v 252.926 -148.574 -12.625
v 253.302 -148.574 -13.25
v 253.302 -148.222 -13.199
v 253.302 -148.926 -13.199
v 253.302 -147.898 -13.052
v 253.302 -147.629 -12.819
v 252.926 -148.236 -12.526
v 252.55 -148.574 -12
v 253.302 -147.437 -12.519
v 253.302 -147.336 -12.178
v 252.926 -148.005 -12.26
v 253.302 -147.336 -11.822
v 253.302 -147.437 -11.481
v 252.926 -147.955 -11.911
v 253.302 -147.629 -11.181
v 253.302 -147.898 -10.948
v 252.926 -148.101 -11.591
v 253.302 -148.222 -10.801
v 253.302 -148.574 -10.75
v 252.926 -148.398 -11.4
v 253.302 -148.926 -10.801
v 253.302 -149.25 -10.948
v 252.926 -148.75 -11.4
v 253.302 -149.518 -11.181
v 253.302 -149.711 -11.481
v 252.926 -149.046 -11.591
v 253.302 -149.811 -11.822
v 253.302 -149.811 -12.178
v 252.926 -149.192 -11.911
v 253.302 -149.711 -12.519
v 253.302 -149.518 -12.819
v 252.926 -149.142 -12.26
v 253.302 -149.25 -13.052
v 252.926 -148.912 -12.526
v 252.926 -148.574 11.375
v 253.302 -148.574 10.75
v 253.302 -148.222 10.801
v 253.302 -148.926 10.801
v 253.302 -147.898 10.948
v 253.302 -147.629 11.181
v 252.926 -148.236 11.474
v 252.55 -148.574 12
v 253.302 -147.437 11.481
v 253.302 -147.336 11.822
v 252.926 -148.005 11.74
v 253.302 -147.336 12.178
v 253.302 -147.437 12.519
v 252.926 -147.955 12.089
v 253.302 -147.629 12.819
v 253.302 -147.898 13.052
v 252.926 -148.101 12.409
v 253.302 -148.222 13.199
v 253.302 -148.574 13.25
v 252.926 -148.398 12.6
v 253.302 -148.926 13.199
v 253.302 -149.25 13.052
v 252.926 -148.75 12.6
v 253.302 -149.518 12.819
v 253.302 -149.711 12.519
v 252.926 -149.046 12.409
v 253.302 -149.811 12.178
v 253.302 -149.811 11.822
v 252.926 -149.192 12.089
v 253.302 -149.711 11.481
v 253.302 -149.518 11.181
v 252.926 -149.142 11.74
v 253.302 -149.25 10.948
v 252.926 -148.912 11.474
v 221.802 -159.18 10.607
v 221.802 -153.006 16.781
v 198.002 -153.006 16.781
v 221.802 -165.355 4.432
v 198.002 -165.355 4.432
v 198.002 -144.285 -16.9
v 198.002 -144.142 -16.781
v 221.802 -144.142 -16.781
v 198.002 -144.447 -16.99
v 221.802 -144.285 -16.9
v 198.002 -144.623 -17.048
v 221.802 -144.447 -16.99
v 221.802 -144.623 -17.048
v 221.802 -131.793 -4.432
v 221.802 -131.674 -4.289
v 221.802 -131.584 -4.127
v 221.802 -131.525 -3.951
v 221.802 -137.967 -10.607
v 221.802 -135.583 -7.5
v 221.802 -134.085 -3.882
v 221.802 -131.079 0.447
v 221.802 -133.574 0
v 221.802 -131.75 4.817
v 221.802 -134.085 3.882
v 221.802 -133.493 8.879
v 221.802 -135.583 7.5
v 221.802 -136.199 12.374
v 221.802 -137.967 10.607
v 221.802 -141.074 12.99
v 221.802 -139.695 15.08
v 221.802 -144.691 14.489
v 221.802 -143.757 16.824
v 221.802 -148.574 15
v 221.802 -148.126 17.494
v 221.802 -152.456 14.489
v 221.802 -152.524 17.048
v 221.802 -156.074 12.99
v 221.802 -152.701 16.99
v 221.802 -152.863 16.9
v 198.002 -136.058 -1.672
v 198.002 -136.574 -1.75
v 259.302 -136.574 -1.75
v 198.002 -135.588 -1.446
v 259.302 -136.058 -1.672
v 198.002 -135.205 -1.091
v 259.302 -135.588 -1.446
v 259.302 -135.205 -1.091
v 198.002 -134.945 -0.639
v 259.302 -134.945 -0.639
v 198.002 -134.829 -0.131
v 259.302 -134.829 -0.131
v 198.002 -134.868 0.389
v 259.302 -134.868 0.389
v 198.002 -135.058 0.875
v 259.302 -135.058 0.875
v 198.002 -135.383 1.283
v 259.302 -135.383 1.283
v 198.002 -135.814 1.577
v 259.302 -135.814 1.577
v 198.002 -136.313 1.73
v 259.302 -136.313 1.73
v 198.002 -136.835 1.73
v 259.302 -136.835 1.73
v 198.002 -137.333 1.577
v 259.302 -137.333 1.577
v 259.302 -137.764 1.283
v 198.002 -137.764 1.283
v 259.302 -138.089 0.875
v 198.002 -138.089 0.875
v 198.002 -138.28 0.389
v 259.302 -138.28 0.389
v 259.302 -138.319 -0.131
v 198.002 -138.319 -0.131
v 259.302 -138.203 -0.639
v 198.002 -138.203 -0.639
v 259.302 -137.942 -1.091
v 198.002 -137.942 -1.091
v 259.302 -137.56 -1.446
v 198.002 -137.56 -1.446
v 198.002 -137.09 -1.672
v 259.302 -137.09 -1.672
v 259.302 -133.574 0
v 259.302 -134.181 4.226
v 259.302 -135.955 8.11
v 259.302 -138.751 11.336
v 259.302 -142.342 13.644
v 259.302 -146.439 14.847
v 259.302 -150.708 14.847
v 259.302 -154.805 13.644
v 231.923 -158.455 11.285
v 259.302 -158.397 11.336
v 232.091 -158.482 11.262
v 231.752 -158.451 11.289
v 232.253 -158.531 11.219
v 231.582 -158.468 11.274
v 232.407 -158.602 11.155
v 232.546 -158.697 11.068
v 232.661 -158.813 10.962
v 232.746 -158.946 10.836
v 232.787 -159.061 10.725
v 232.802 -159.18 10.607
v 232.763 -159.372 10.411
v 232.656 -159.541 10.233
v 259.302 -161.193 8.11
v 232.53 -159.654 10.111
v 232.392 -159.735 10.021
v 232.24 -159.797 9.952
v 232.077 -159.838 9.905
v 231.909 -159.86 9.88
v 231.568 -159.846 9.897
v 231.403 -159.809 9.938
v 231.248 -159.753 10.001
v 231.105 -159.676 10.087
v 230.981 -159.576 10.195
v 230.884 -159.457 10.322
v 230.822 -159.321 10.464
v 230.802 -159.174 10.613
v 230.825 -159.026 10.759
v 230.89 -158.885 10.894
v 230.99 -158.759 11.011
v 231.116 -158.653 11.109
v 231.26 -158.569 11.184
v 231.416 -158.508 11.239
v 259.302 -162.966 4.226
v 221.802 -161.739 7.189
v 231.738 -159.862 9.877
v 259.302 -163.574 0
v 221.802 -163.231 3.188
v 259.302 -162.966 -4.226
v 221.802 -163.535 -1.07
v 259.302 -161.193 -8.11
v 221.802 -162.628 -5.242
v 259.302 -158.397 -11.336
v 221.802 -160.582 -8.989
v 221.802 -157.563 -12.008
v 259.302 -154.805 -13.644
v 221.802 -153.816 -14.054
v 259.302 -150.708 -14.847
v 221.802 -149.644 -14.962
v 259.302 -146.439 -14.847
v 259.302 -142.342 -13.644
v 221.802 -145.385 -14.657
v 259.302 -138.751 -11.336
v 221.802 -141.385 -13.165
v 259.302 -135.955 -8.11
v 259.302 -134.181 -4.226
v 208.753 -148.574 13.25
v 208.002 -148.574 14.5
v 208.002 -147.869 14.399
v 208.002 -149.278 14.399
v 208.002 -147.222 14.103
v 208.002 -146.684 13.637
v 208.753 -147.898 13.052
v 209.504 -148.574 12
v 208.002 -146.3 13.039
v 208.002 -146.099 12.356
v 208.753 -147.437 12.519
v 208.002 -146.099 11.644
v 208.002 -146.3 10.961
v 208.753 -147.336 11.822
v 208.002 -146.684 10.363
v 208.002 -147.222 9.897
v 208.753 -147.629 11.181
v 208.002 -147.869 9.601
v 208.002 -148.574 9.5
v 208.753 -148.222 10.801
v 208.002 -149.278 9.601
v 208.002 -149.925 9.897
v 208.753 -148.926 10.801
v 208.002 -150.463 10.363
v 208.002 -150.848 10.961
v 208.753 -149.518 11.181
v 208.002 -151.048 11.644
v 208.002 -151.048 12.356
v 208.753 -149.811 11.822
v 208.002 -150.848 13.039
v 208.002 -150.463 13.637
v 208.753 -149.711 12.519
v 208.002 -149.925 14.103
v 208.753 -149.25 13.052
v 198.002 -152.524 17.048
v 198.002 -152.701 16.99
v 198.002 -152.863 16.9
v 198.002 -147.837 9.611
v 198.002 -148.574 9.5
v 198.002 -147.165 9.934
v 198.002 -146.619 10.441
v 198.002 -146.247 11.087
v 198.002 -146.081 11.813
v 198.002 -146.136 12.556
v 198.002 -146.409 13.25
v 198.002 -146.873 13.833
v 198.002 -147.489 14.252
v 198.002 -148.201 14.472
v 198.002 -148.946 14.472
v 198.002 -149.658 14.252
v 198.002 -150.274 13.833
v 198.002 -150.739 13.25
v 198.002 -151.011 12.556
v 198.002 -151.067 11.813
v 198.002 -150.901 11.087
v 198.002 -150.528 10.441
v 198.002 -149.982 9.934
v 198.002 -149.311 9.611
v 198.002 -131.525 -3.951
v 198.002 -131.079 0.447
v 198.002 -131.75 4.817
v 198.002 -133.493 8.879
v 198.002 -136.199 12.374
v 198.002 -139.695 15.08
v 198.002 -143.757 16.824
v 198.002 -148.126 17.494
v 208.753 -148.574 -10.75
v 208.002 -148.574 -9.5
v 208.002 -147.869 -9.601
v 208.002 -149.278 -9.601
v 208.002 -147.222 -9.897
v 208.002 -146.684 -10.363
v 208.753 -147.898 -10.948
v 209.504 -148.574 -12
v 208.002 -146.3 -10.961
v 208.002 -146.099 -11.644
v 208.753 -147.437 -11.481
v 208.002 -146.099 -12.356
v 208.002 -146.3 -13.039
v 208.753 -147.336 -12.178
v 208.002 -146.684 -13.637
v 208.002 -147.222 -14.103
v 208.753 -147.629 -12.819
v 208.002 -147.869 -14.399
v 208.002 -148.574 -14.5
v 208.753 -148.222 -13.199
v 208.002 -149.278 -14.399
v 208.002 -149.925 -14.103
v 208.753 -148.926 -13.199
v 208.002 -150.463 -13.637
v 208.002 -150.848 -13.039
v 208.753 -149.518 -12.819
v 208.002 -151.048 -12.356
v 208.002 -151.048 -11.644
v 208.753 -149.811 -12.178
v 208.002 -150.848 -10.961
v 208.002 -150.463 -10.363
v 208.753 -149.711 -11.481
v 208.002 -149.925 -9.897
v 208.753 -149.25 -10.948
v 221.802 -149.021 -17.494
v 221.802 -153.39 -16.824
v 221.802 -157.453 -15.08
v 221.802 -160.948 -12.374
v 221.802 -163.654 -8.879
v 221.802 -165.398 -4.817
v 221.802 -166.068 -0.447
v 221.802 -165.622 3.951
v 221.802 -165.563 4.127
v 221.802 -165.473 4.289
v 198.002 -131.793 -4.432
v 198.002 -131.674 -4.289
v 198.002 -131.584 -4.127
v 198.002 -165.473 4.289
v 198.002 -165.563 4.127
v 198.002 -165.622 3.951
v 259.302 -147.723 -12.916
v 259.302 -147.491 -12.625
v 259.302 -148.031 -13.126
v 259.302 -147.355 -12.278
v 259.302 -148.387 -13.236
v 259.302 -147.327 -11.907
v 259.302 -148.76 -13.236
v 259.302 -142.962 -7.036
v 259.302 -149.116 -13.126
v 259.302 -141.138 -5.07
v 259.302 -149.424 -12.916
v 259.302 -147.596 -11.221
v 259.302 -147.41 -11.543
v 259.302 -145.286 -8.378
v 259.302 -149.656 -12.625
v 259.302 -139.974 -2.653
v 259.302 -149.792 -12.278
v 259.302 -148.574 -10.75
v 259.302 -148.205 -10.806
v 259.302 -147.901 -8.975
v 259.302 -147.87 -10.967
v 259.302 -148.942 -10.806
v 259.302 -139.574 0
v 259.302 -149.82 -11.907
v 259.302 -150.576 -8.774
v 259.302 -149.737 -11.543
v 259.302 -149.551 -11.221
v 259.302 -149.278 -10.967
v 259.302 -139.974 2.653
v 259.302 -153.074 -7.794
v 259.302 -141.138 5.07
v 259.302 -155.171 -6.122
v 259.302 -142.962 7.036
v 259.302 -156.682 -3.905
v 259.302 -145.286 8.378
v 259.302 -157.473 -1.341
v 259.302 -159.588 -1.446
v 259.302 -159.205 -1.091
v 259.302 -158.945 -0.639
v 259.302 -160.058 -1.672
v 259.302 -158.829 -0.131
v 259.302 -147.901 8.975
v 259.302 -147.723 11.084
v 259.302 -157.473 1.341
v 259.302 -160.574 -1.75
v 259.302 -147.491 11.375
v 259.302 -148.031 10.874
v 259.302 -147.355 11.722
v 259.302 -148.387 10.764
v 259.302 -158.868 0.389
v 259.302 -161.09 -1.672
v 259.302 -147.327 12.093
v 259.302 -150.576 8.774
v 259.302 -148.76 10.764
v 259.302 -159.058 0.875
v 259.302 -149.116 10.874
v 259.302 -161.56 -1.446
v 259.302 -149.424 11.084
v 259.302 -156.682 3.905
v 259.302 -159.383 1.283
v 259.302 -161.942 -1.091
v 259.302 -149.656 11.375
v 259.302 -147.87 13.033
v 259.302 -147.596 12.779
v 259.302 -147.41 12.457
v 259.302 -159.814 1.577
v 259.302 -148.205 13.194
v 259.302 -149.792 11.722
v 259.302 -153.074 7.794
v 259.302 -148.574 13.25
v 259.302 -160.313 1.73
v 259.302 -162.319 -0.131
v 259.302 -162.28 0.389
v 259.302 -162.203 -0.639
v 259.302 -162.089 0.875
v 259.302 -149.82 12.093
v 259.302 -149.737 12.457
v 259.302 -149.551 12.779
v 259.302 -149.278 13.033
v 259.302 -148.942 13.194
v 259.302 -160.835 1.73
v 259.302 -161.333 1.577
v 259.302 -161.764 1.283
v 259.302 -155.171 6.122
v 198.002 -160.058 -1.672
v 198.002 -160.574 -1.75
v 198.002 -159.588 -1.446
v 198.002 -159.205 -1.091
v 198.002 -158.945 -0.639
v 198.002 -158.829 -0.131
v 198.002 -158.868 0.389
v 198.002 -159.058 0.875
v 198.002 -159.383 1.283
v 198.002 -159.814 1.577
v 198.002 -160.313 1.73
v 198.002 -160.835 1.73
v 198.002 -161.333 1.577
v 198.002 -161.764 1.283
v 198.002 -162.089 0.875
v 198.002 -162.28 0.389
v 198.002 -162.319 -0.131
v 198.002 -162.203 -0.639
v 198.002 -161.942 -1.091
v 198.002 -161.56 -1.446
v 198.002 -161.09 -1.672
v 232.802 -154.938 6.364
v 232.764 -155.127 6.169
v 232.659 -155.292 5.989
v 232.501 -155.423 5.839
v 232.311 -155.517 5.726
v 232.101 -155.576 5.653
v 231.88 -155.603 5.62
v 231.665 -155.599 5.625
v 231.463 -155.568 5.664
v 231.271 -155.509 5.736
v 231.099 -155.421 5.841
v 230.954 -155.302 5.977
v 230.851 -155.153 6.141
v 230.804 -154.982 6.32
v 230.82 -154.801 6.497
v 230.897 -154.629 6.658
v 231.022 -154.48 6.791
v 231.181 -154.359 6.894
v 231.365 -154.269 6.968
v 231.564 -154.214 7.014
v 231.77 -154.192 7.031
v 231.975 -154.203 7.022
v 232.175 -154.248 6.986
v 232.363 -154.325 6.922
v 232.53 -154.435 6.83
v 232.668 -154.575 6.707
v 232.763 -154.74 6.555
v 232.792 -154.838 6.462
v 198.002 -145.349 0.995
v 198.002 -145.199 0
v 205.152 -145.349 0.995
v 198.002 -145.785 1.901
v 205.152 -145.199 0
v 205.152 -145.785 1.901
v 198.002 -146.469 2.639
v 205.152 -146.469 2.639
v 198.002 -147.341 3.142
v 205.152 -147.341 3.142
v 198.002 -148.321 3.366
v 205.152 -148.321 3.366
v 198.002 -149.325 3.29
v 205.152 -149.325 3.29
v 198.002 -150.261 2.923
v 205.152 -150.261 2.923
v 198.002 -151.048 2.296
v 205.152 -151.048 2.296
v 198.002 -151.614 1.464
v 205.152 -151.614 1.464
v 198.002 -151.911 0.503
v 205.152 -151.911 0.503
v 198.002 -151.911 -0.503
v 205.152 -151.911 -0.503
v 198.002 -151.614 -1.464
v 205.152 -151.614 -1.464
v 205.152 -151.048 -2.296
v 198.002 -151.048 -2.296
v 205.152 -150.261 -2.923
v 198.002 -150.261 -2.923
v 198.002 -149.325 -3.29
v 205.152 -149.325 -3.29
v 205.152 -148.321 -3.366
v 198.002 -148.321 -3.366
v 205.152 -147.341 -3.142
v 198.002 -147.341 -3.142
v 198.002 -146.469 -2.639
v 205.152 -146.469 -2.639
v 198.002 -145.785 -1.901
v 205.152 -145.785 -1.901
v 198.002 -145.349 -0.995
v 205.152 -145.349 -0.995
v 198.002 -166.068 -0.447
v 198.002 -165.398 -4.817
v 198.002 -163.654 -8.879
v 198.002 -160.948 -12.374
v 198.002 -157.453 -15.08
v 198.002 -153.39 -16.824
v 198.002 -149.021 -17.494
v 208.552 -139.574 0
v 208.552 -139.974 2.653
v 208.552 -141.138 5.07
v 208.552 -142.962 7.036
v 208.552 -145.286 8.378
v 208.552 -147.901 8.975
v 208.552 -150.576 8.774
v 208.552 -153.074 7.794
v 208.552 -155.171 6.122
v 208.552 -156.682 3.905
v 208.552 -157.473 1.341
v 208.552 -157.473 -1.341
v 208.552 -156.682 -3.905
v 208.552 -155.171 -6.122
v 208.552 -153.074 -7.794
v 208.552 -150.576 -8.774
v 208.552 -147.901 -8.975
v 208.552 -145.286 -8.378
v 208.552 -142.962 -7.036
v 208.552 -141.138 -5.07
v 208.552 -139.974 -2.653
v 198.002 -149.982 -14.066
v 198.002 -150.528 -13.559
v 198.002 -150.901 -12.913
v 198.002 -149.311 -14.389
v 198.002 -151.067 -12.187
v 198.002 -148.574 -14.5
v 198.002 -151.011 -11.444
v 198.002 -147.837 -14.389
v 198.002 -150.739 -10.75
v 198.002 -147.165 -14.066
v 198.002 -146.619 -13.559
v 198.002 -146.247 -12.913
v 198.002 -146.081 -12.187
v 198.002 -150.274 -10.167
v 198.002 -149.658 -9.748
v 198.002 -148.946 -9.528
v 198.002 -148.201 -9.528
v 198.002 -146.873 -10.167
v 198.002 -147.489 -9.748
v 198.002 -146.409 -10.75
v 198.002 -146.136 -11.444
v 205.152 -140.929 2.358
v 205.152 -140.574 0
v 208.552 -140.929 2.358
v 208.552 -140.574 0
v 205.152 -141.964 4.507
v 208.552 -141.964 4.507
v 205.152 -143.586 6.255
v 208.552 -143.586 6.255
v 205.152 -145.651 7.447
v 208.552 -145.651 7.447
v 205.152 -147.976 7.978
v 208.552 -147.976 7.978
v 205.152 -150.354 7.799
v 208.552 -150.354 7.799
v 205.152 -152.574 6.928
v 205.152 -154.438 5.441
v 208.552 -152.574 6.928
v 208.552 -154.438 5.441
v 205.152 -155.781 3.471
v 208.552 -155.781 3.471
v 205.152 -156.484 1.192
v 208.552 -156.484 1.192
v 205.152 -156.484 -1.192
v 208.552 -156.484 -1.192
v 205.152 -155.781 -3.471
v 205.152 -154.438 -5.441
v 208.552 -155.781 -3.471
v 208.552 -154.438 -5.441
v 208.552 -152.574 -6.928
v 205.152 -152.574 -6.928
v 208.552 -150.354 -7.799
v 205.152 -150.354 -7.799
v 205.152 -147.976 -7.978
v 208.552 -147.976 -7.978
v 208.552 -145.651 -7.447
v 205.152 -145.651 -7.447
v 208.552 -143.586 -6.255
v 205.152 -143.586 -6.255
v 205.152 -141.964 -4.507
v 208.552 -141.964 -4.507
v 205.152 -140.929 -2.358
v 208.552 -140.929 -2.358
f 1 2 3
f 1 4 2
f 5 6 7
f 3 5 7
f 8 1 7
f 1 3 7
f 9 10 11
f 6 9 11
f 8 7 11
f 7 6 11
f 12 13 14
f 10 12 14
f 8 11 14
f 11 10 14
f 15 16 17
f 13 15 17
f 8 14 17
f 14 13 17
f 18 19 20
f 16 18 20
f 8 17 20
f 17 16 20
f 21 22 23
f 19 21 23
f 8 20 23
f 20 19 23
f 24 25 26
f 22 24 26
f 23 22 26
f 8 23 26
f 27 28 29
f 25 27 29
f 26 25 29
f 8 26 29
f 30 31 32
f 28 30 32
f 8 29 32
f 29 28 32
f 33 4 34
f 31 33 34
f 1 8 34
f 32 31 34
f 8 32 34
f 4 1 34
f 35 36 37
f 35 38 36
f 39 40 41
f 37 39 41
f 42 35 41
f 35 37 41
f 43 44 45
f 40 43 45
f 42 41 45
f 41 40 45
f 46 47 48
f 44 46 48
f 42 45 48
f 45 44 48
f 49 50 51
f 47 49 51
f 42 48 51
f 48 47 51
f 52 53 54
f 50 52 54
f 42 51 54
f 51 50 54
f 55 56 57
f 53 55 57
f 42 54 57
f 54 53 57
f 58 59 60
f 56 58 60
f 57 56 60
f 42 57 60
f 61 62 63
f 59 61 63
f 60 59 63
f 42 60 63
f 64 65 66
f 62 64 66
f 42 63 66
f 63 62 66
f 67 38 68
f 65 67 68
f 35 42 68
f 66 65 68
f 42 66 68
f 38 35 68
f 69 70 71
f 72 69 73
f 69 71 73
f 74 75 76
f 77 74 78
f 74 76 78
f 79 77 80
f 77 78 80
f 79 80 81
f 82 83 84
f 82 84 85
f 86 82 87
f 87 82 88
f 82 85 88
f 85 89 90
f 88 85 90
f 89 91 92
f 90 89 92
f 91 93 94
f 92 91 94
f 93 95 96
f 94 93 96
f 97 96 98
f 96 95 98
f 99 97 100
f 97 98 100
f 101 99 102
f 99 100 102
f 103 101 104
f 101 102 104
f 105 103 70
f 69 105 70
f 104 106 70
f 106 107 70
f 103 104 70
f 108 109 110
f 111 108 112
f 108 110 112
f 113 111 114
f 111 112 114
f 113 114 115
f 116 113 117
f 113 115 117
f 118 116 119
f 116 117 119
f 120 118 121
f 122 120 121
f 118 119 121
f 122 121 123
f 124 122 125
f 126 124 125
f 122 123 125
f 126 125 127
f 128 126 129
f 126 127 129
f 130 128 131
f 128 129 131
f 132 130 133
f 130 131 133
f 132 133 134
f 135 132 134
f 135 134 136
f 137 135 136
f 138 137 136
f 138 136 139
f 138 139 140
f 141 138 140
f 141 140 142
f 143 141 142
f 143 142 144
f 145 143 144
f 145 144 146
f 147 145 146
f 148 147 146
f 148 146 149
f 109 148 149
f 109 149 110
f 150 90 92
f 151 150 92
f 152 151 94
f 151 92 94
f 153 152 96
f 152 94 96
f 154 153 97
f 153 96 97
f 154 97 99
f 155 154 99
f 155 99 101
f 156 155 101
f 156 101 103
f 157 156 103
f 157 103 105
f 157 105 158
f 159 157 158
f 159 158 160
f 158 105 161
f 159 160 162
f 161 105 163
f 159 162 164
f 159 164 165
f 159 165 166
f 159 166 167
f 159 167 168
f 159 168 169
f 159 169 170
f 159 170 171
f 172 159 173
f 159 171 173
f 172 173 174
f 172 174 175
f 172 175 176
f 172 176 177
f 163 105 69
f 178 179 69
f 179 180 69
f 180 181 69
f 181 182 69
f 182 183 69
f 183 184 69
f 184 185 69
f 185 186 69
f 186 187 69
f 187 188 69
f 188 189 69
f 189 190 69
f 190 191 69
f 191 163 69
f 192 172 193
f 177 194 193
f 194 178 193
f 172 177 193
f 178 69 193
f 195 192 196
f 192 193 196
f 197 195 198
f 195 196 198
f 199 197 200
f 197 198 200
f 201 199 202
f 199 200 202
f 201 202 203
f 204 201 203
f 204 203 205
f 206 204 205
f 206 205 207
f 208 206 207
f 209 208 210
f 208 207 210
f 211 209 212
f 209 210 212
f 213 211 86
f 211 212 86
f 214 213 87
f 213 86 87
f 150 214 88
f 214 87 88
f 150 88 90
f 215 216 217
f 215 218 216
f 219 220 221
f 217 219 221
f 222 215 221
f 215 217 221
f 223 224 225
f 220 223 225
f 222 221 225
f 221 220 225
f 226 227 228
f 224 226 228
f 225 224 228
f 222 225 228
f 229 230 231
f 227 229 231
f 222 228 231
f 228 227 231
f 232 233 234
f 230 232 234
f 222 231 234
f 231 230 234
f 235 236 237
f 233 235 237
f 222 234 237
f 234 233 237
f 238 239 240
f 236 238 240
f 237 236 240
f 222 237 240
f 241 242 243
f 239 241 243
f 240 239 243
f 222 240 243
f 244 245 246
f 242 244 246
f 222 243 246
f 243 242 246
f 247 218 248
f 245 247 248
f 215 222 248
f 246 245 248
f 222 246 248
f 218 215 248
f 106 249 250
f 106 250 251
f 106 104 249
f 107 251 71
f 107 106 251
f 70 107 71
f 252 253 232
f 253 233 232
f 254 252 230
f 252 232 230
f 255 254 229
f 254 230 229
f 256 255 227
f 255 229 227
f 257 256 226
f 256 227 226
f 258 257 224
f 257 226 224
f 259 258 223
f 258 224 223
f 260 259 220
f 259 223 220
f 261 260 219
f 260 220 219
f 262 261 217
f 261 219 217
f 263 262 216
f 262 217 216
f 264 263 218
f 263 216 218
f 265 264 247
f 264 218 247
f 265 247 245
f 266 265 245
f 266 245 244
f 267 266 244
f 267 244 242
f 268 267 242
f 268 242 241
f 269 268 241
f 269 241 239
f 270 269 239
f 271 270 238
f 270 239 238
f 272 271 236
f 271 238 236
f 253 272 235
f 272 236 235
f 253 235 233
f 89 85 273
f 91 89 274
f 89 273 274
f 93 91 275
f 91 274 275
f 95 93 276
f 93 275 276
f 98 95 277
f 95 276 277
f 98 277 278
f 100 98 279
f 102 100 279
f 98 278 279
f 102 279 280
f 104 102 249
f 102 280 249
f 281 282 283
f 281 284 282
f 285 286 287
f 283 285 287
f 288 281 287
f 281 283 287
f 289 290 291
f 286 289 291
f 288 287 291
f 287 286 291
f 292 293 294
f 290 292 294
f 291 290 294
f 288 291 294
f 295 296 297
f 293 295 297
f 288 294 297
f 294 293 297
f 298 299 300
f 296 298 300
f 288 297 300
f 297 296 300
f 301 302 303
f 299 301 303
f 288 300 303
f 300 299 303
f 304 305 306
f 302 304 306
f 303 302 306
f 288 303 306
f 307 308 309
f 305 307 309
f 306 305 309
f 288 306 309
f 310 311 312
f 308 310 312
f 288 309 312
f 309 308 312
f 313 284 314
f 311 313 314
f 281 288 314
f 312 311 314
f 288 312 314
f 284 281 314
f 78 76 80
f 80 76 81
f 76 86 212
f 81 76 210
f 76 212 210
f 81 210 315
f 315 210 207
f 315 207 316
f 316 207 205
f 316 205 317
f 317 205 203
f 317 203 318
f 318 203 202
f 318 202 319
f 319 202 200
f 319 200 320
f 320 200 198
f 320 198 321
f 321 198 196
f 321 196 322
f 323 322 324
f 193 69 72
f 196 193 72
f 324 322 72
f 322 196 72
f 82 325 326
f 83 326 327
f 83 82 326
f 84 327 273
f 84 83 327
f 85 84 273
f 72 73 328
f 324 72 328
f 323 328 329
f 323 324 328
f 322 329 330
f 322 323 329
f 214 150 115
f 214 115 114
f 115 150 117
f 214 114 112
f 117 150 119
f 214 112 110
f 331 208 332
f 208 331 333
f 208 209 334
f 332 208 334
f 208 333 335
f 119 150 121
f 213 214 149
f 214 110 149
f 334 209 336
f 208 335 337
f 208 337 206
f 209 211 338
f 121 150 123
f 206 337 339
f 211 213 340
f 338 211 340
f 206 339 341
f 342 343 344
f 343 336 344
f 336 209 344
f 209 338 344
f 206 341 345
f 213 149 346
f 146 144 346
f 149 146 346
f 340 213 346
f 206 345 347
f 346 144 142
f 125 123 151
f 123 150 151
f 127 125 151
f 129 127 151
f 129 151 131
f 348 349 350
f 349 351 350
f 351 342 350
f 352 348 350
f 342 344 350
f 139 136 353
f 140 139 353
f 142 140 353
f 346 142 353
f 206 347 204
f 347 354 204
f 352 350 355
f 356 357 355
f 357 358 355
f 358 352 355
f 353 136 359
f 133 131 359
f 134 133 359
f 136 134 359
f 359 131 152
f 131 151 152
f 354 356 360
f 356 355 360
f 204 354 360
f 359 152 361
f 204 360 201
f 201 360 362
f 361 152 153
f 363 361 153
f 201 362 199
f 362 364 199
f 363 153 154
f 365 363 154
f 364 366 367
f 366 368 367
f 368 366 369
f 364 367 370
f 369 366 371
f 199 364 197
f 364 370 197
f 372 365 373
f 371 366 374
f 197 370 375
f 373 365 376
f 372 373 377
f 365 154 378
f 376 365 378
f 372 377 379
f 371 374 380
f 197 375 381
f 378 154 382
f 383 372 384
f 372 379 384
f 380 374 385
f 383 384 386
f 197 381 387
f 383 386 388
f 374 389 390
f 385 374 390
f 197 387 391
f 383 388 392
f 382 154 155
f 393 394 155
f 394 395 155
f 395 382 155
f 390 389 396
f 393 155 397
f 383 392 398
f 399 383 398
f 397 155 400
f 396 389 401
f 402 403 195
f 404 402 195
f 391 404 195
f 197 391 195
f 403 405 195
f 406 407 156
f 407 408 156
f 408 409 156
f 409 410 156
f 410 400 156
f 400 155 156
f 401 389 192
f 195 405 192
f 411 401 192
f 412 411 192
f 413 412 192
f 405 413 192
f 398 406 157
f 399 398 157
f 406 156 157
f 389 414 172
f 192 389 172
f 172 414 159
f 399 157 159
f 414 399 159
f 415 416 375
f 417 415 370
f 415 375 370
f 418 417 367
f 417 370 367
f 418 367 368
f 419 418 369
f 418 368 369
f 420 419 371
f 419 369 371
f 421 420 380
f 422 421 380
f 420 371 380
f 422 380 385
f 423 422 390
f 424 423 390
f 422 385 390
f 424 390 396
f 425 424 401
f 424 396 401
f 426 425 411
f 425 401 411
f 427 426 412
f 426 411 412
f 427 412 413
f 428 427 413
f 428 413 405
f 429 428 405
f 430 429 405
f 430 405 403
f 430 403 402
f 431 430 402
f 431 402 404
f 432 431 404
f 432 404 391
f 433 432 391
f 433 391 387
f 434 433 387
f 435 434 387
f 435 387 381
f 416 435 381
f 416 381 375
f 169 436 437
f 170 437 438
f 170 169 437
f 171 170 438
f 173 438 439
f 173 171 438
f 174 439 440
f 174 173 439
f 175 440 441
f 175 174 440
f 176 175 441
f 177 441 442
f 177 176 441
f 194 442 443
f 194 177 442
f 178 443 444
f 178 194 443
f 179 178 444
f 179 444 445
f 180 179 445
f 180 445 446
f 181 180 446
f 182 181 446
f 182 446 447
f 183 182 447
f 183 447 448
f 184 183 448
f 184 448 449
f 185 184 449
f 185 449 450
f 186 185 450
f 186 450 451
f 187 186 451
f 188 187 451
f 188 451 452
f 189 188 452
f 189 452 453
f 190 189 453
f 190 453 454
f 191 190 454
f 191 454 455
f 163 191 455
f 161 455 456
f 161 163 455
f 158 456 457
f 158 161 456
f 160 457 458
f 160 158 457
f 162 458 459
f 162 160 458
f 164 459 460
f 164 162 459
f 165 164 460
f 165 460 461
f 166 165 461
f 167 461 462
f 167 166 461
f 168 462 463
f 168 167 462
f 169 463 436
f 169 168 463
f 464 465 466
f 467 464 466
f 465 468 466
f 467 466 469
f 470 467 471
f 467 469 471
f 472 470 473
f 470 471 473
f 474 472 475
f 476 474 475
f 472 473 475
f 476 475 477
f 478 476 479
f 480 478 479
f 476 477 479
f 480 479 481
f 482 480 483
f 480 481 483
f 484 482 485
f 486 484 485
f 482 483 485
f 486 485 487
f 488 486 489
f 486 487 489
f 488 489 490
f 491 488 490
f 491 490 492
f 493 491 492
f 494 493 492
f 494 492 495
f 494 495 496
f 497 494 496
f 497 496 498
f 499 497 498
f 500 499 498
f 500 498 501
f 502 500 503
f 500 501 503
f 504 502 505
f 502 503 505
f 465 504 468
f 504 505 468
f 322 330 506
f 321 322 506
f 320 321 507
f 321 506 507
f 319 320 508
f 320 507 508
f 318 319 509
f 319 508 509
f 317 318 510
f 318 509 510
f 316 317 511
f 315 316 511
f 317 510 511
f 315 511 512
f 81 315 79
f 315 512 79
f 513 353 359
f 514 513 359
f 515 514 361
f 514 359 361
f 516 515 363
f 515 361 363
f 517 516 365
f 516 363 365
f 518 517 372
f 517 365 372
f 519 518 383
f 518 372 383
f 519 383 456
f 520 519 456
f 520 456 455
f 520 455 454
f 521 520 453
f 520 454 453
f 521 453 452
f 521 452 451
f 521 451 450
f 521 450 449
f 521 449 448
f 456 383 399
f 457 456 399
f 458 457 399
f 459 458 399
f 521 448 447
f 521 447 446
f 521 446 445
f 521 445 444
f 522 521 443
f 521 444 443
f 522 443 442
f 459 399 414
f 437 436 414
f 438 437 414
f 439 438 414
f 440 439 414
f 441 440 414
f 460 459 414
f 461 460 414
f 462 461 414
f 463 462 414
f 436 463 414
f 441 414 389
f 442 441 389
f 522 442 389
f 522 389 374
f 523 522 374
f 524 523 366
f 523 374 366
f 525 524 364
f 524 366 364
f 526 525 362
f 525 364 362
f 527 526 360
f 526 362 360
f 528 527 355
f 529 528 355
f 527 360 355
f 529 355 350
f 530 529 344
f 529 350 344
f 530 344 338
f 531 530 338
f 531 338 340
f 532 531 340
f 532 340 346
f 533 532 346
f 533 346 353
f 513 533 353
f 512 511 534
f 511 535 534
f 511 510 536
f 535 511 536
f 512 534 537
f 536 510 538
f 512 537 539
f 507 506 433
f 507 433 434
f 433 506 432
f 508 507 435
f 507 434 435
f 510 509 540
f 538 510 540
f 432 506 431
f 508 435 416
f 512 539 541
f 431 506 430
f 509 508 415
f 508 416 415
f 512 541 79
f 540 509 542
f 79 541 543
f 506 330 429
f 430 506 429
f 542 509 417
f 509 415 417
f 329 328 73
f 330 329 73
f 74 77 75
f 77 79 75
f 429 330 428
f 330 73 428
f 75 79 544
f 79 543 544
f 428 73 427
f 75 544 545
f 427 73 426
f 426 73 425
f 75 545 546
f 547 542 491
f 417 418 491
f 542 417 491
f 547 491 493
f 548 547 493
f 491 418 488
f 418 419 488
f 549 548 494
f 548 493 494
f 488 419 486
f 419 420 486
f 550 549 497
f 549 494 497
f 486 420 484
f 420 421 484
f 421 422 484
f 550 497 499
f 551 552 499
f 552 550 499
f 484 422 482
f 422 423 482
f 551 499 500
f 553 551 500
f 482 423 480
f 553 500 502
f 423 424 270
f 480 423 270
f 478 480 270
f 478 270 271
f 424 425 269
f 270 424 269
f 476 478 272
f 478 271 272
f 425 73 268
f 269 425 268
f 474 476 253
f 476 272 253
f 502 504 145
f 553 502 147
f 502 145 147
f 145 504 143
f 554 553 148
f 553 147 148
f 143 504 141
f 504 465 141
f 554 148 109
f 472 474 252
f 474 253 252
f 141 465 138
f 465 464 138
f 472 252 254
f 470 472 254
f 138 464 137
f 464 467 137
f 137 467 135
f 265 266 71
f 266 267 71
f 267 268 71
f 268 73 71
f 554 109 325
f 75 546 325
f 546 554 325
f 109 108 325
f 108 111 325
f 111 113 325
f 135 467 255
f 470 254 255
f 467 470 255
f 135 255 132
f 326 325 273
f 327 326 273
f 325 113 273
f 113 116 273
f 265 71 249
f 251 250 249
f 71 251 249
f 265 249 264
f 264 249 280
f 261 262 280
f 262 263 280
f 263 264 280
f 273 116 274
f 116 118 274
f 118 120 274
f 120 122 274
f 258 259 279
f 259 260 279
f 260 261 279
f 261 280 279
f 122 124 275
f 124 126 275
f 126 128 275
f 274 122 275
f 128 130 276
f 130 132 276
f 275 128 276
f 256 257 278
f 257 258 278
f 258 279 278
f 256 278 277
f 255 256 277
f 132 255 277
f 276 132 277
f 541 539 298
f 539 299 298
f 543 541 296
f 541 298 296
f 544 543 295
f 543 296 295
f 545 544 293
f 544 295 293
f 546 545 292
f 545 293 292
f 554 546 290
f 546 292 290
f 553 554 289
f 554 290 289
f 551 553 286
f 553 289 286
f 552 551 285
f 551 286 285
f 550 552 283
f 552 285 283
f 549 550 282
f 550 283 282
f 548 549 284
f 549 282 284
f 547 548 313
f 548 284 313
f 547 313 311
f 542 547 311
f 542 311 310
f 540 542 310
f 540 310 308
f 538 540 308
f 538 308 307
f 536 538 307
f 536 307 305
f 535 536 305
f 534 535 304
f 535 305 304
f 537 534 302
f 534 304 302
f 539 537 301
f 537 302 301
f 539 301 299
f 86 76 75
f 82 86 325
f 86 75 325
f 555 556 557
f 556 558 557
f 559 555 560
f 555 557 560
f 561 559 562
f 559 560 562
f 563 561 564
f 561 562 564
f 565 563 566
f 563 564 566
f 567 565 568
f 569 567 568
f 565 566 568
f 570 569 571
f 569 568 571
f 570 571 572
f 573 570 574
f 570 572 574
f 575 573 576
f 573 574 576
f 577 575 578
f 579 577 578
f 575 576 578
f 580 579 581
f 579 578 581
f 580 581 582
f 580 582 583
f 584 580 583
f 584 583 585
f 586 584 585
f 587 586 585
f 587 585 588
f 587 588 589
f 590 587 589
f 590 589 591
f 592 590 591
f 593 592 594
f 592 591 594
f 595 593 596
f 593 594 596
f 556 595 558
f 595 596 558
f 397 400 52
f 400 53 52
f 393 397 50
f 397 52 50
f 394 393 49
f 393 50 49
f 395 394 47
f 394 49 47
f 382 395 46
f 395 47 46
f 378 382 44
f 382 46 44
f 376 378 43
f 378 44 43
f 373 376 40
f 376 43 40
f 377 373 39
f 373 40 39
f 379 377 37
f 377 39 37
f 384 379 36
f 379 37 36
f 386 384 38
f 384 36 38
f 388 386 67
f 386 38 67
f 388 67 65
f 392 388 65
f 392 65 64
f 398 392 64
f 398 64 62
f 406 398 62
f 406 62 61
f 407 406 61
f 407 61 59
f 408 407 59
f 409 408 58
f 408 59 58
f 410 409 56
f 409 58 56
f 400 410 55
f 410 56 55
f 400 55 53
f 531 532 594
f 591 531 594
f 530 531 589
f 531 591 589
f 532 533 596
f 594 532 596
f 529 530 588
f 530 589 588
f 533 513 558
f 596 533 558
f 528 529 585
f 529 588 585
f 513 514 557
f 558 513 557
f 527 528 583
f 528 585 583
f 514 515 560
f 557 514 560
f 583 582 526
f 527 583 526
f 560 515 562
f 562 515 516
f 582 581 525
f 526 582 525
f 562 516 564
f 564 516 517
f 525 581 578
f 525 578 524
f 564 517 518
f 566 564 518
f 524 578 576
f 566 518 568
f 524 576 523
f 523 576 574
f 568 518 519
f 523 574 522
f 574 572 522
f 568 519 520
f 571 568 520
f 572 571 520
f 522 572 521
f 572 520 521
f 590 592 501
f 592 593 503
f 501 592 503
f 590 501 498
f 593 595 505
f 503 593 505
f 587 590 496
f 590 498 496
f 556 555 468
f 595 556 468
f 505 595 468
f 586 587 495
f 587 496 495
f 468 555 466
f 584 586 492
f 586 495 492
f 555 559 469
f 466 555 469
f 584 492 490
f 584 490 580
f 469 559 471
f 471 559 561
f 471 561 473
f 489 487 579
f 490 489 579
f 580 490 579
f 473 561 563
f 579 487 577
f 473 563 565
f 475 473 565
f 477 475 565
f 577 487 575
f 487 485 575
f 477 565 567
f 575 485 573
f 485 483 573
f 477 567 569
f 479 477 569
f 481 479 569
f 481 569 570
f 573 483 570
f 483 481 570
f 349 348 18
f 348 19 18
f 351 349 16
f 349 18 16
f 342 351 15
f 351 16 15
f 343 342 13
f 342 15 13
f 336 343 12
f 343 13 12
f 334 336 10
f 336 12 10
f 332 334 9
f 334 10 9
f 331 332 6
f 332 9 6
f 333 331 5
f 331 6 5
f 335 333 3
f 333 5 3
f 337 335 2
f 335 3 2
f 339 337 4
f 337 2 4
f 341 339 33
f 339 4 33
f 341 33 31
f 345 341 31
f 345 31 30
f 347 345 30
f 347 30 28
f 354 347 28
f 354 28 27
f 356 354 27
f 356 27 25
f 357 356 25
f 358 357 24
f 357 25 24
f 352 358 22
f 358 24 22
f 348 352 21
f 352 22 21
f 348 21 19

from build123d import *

# Parameters (mm, degrees)
CUT_EXTRUDE1_REACH          = 179.889
SKETCH8_R                   = 1.75
TAP_DRILL_FOR_M3_TAP2_D     = 2.5
TAP_DRILL_FOR_M3_TAP2_DEPTH = 6
TAP_DRILL_FOR_M3_TAP2_TIP   = 0.751075774
TAP_DRILL_FOR_M6_TAP1_D     = 5
TAP_DRILL_FOR_M6_TAP1_DEPTH = 10
TAP_DRILL_FOR_M6_TAP1_TIP   = 1.502151548
CUT_EXTRUDE2_REACH          = 179.889
FILLET1_R                   = 1
CUT_EXTRUDE3_REACH          = 335.718
SKETCH18_R                  = 1


with BuildPart() as part:
    # Sketch3 → Revolve1 (revolve)
    with BuildSketch(Plane.XY):
        Polygon((208.551545348, -139.573704322), (250.685153788, -139.573704322), (259.301545348, -139.573704322), (259.301545348, -133.573704322), (238.427343436, -133.573704322), (221.801545348, -133.573704322), (221.801545348, -131.073704322), (198.001545348, -131.073704322), (198.001545348, -133.573704322), (198.001545348, -140.556086521), (198.001545348, -145.198704322), (205.151545348, -145.198704322), (205.151545348, -140.573704322), (208.551545348, -140.573704322), align=None)
    revolve(axis=Axis((227.370475166, -148.573704322, 0), (1, 0, 0)))

    # Sketch8 → Cut-Extrude1 (cut, up to next)
    with BuildSketch(Plane(origin=(259.301545348, 0, 0), x_dir=(0, 0, -1), z_dir=(1, 0, 0)), mode=Mode.PRIVATE) as cut_extrude1_sk1:
        with Locations((0, -136.573704322)):
            Circle(SKETCH8_R)
    cut_extrude1_tool1 = extrude(cut_extrude1_sk1.sketch, amount=-CUT_EXTRUDE1_REACH, mode=Mode.PRIVATE) & part.part
    # Sketch8 → Cut-Extrude1 (cut, up to next)
    with BuildSketch(Plane(origin=(259.301545348, 0, 0), x_dir=(0, 0, -1), z_dir=(1, 0, 0)), mode=Mode.PRIVATE) as cut_extrude1_sk2:
        with Locations((0, -160.573704322)):
            Circle(SKETCH8_R)
    cut_extrude1_tool2 = extrude(cut_extrude1_sk2.sketch, amount=-CUT_EXTRUDE1_REACH, mode=Mode.PRIVATE) & part.part
    add(cut_extrude1_tool1.solids().sort_by_distance((259.301545, -136.573704, 0))[0], mode=Mode.SUBTRACT)
    add(cut_extrude1_tool2.solids().sort_by_distance((259.301545, -160.573704, 0))[0], mode=Mode.SUBTRACT)

    # Tap Drill for M3 Tap2
    with Locations(Plane(origin=(259.301545348, 0, 0), x_dir=(0, 0, -1), z_dir=(1, 0, 0))):
        with Locations((-12, -148.573704322), (12, -148.573704322)):
            Hole(TAP_DRILL_FOR_M3_TAP2_D / 2, depth=TAP_DRILL_FOR_M3_TAP2_DEPTH)
            with Locations((0, 0, -(TAP_DRILL_FOR_M3_TAP2_DEPTH + TAP_DRILL_FOR_M3_TAP2_TIP / 2))):  # 118° drill point
                Cone(0, TAP_DRILL_FOR_M3_TAP2_D / 2, TAP_DRILL_FOR_M3_TAP2_TIP, mode=Mode.SUBTRACT)

    # Tap Drill for M6 Tap1
    with Locations(Plane.ZY.offset(-198.001545348)):
        with Locations((12, -148.573704322), (-12, -148.573704322)):
            Hole(TAP_DRILL_FOR_M6_TAP1_D / 2, depth=TAP_DRILL_FOR_M6_TAP1_DEPTH)
            with Locations((0, 0, -(TAP_DRILL_FOR_M6_TAP1_DEPTH + TAP_DRILL_FOR_M6_TAP1_TIP / 2))):  # 118° drill point
                Cone(0, TAP_DRILL_FOR_M6_TAP1_D / 2, TAP_DRILL_FOR_M6_TAP1_TIP, mode=Mode.SUBTRACT)

    # Sketch16 → Cut-Extrude2 (cut, up to next)
    with BuildSketch(Plane.ZY.offset(-198.001545348), mode=Mode.PRIVATE) as cut_extrude2_sk1:
        Polygon((-16.98037611, -144.340876996), (-4.232827326, -131.593328212), (-6.354147669, -129.472007869), (-19.101696453, -142.219556653), align=None)
    cut_extrude2_tool1 = extrude(cut_extrude2_sk1.sketch, amount=-CUT_EXTRUDE2_REACH, mode=Mode.PRIVATE) & part.part
    # Sketch16 → Cut-Extrude2 (cut, up to next)
    with BuildSketch(Plane.ZY.offset(-198.001545348), mode=Mode.PRIVATE) as cut_extrude2_sk2:
        Polygon((4.232827326, -165.554080432), (6.354147669, -167.675400776), (19.101696453, -154.927851992), (16.98037611, -152.806531648), align=None)
    cut_extrude2_tool2 = extrude(cut_extrude2_sk2.sketch, amount=-CUT_EXTRUDE2_REACH, mode=Mode.PRIVATE) & part.part
    add(cut_extrude2_tool1.solids().sort_by_distance((198.001545, -136.906442, -11.667262))[0], mode=Mode.SUBTRACT)
    add(cut_extrude2_tool2.solids().sort_by_distance((198.001545, -160.240966, 11.667262))[0], mode=Mode.SUBTRACT)

    # Fillet1
    fillet1_edges = [part.edges().sort_by_distance(p)[0] for p in [
        (209.901545348, -165.554080432, 4.232827326),
        (209.901545348, -152.806531648, 16.98037611),
        (209.901545348, -144.340876996, -16.98037611),
        (209.901545348, -131.593328212, -4.232827326),
    ]]
    fillet(fillet1_edges, radius=FILLET1_R)

    # Sketch18 → Cut-Extrude3 (cut, up to next)
    with BuildSketch(Plane(origin=(0, -289.84438159, -120.057473832), x_dir=(1, 0, 0), z_dir=(0, 0.7071067811865441, -0.7071067811865509)), mode=Mode.PRIVATE) as cut_extrude3_sk1:
        with Locations((231.801545348, -184.786907758)):
            Circle(SKETCH18_R)
    cut_extrude3_tool1 = extrude(cut_extrude3_sk1.sketch, amount=CUT_EXTRUDE3_REACH, mode=Mode.PRIVATE) & part.part
    add(cut_extrude3_tool1.solids().sort_by_distance((231.801545, -159.180306, 10.606602))[0], mode=Mode.SUBTRACT)


solid = part.part
